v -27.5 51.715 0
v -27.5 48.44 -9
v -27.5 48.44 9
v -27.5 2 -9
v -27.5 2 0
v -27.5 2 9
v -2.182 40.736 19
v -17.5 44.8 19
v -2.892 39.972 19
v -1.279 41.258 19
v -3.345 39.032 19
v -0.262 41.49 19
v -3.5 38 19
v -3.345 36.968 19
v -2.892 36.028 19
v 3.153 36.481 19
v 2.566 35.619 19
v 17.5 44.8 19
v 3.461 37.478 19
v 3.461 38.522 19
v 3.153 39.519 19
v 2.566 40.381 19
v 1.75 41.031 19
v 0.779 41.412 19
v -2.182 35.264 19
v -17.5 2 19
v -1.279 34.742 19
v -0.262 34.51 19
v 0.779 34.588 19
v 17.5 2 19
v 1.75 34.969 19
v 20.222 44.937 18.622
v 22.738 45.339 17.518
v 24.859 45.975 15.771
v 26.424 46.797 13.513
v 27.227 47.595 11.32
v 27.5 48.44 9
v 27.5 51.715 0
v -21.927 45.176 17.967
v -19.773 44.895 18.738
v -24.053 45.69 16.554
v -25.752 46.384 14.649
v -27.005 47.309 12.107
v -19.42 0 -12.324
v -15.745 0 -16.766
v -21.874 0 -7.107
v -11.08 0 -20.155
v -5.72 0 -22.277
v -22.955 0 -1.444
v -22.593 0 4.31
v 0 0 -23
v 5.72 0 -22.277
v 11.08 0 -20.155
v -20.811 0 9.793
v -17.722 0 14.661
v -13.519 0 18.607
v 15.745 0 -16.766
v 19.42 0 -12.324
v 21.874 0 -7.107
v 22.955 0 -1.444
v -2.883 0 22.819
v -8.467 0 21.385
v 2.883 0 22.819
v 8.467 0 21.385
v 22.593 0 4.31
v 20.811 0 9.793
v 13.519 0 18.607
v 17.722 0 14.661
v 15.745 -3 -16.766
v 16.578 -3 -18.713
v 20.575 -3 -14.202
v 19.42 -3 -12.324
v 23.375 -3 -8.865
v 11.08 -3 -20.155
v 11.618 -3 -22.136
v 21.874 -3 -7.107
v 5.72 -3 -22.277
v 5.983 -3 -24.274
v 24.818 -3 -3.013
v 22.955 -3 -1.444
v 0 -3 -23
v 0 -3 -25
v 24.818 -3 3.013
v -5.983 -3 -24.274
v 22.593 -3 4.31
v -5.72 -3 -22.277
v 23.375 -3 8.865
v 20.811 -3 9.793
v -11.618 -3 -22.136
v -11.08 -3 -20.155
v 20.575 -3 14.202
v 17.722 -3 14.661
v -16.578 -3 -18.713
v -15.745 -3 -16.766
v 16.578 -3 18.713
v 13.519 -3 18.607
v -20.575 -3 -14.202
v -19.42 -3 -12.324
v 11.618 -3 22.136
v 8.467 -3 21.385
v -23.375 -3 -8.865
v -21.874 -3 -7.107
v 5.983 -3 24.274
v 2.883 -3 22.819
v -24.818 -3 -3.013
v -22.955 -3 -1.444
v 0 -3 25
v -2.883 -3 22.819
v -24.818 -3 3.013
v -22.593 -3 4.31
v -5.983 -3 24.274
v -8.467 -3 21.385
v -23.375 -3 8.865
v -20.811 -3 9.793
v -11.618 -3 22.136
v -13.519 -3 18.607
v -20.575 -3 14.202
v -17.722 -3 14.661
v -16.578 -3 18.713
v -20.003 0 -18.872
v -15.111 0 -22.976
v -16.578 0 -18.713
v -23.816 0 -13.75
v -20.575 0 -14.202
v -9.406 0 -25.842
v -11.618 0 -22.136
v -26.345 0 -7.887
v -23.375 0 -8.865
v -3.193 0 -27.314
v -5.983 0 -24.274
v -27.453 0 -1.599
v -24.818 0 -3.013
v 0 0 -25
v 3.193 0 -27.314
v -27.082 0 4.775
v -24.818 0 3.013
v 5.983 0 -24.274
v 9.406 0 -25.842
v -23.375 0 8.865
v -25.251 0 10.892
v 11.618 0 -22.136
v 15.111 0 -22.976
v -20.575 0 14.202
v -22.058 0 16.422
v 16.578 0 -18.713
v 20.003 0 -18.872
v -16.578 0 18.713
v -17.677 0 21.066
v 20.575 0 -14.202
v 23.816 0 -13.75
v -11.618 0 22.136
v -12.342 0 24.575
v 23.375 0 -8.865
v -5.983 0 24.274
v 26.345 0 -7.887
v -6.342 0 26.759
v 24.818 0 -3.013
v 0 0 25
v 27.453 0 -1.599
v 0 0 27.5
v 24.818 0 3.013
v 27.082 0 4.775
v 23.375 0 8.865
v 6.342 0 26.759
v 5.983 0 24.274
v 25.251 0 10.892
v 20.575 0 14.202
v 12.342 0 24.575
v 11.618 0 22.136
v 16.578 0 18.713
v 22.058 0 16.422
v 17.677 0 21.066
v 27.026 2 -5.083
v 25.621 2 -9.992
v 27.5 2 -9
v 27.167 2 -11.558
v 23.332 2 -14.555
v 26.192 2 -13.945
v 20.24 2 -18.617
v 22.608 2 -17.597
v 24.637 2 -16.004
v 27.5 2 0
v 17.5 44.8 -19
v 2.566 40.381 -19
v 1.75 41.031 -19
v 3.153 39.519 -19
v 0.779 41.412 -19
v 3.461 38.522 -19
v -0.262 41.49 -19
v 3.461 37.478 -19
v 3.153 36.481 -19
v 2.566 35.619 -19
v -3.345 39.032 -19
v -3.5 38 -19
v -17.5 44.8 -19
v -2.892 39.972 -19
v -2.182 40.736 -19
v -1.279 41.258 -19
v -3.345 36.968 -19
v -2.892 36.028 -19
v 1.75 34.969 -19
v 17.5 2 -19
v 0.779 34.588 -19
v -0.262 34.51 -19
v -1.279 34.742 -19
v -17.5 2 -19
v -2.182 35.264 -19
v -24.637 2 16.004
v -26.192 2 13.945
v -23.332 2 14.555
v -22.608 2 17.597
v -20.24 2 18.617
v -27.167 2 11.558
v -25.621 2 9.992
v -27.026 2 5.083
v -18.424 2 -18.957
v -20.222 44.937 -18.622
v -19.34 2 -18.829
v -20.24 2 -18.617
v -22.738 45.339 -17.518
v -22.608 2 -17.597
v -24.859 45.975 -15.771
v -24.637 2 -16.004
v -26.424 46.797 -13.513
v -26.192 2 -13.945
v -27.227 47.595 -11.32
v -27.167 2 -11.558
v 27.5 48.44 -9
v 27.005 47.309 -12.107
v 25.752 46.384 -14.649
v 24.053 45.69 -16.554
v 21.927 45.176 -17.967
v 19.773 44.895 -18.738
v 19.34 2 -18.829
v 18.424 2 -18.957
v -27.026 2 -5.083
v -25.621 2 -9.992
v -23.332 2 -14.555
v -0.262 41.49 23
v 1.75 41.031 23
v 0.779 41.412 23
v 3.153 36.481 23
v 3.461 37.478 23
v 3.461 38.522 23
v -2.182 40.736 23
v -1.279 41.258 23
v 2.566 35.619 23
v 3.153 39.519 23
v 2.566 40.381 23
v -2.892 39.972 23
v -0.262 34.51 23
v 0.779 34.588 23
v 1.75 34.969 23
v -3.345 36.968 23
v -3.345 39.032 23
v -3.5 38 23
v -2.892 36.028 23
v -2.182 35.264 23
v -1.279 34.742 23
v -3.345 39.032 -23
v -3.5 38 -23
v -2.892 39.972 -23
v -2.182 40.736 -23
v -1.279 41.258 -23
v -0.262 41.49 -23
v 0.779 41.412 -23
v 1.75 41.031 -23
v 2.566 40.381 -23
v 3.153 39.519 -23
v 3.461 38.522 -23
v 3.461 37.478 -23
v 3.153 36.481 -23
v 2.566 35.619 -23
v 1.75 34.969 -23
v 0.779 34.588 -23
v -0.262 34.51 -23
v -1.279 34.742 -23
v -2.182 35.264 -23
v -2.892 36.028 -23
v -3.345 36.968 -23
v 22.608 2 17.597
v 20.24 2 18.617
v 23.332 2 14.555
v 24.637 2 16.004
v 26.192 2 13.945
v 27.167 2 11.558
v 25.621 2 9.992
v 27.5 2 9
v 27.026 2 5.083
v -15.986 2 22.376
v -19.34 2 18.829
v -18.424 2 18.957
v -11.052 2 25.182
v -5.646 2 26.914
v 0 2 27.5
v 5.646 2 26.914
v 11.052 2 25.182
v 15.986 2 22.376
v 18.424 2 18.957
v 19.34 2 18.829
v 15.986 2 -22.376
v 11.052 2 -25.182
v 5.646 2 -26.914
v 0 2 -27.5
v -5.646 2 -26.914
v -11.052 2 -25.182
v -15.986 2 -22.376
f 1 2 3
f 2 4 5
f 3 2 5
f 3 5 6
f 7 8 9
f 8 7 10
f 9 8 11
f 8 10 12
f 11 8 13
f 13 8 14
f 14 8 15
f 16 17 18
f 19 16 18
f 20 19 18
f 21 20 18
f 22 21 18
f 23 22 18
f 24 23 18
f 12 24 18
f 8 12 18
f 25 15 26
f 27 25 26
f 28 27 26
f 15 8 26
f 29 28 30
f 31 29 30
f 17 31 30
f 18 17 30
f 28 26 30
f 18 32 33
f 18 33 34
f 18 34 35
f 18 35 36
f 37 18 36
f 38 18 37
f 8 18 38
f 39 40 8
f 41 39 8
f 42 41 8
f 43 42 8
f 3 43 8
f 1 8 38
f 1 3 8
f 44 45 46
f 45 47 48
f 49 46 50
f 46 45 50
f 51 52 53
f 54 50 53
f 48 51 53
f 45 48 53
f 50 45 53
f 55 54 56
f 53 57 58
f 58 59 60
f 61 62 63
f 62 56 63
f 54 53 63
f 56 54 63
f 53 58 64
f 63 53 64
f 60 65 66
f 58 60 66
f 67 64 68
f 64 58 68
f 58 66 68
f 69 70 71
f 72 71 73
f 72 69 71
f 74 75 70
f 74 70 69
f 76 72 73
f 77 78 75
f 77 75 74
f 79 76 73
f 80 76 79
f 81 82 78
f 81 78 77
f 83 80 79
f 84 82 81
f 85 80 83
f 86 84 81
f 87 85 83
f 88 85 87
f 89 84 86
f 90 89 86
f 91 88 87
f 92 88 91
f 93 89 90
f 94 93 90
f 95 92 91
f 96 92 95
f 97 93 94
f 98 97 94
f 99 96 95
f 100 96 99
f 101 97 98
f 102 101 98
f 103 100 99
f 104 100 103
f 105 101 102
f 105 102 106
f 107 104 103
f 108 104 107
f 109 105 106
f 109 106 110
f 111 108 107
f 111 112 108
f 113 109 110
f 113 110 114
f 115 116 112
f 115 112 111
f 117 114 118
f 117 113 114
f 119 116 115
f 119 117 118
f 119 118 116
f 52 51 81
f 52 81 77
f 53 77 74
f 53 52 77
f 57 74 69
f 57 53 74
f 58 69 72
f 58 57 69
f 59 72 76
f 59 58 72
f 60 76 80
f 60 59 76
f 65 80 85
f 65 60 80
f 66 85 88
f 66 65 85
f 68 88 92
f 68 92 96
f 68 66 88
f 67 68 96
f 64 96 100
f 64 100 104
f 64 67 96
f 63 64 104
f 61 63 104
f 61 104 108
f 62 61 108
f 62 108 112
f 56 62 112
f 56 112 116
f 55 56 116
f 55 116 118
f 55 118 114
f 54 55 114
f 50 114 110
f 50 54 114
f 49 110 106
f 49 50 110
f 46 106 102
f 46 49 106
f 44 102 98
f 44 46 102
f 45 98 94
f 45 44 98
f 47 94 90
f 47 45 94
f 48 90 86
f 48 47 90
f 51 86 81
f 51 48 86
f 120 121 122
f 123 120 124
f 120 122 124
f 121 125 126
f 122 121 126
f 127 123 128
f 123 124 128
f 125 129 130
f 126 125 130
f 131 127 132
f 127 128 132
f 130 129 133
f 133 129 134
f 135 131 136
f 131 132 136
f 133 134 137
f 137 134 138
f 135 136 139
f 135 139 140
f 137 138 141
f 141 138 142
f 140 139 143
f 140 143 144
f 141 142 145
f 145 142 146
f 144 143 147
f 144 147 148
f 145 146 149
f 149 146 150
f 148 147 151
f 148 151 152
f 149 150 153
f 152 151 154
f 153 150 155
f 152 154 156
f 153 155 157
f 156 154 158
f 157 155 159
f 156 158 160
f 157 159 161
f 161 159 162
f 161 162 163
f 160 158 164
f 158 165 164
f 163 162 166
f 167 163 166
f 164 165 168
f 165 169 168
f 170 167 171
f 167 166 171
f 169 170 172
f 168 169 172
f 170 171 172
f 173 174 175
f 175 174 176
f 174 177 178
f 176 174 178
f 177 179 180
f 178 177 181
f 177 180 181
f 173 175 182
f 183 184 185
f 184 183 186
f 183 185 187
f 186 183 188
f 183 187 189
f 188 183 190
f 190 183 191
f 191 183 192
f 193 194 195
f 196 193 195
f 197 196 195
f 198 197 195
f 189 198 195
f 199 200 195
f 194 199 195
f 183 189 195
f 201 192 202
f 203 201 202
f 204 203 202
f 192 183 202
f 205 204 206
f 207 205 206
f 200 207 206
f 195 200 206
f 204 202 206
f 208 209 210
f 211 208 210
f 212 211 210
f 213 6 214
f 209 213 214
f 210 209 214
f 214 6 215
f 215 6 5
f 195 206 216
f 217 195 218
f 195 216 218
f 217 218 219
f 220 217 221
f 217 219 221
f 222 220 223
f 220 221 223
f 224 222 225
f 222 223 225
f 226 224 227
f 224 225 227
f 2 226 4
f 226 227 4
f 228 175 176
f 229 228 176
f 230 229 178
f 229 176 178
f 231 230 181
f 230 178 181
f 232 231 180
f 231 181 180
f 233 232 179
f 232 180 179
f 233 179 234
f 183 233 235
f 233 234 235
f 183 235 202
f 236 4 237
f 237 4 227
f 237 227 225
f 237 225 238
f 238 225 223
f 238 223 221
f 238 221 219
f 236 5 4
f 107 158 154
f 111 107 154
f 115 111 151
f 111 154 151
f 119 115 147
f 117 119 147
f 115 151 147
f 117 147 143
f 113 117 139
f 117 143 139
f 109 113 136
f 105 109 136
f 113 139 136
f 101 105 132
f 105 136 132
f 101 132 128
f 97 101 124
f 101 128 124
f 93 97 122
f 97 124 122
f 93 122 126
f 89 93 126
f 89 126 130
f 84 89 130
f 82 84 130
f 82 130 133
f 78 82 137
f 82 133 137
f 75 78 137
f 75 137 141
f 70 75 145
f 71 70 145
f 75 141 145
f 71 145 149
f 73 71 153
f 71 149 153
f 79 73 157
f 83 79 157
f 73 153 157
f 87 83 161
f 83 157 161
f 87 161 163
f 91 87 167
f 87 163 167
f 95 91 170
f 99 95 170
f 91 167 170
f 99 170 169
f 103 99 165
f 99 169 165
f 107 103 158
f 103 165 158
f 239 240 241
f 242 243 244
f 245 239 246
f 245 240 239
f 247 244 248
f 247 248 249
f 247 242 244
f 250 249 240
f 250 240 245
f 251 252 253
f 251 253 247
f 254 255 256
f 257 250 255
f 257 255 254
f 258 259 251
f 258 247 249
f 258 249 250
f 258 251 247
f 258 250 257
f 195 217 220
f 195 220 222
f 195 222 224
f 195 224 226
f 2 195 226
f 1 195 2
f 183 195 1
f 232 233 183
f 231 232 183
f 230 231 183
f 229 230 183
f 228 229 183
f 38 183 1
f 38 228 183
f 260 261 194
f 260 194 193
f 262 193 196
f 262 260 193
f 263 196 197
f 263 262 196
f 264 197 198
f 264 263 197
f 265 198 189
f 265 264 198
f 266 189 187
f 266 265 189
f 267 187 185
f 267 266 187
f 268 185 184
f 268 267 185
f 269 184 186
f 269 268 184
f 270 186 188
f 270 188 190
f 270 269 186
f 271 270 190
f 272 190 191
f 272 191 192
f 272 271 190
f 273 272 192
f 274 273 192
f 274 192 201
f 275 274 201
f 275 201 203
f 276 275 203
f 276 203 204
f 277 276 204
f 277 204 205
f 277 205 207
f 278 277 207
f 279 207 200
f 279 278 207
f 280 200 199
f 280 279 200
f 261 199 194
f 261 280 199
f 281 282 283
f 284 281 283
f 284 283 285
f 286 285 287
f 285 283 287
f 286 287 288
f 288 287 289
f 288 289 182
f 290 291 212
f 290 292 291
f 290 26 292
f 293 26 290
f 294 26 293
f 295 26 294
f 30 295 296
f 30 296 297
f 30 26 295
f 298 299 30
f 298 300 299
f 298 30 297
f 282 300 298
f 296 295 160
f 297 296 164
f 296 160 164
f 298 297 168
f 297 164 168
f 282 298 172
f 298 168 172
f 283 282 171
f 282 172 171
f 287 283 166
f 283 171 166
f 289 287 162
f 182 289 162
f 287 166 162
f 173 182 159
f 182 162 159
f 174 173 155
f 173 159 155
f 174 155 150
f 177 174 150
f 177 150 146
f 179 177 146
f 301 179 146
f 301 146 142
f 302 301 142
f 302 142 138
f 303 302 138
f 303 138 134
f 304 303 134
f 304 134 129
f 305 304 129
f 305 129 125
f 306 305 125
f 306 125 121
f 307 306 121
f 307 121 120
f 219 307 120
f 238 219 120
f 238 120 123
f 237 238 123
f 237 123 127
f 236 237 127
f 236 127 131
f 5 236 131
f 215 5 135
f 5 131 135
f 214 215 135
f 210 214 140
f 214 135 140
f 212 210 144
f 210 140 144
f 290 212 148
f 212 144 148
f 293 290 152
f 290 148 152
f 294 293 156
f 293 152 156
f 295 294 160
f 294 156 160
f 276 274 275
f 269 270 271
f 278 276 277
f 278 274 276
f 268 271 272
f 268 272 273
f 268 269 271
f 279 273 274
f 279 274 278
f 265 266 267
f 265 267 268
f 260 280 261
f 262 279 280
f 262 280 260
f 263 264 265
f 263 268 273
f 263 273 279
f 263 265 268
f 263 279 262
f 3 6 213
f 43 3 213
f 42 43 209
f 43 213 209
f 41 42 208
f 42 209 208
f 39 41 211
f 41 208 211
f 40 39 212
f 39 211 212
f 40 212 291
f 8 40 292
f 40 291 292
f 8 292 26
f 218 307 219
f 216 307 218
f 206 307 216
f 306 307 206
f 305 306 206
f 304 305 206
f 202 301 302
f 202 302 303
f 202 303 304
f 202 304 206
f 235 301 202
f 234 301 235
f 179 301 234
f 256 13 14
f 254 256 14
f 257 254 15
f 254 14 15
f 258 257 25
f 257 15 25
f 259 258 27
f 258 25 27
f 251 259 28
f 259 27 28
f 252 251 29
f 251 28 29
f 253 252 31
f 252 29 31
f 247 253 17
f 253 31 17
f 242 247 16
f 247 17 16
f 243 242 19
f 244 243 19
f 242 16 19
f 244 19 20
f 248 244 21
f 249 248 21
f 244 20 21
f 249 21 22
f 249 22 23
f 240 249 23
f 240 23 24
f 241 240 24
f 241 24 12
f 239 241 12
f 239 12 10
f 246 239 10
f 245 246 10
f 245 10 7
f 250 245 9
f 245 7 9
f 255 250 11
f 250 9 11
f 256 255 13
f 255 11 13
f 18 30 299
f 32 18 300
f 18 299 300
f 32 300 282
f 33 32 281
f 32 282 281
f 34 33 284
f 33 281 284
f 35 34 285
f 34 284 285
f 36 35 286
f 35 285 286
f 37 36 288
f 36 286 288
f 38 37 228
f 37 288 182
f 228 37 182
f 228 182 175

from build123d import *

# Parameters (mm, degrees)
IZIM1_R                     = 27.5
Y_KSEKLIK_EKSTR_ZYON1_DEPTH = 2
IZIM2_R                     = 25
IZIM2_R_2                   = 23
Y_KSEKLIK_EKSTR_ZYON2_DEPTH = 3
Y_KSEKLIK_EKSTR_ZYON3_DEPTH = 50.8
PAH1_SIZE                   = 8
PAH1_SIZE_2                 = 21.979819356
PAH2_SIZE                   = 8
PAH2_SIZE_2                 = 21.979819356
IZIM4_R                     = 3.5
Y_KSEKLIK_EKSTR_ZYON4_DEPTH = 4
Y_KSEKLIK_EKSTR_ZYON5_START = 4
IZIM5_R                     = 3.5
Y_KSEKLIK_EKSTR_ZYON5_DEPTH = 4


with BuildPart() as part:
    # Çizim1 → Yükseklik-Ekstrüzyon1 (new body)
    with BuildSketch(Plane(origin=(0, 0, 0), x_dir=(1, 0, 0), z_dir=(0, 1, 0))):
        with Locations(Location((0, 0, 0), (0, 0, 270))):
            Circle(IZIM1_R)
    extrude(amount=Y_KSEKLIK_EKSTR_ZYON1_DEPTH)

    # Çizim2 → Yükseklik-Ekstrüzyon2 (add)
    with BuildSketch(Plane.XZ):
        with Locations(Location((0, 0, 0), (0, 0, 90))):
            Circle(IZIM2_R)
        with Locations(Location((0, 0, 0), (0, 0, 270))):
            Circle(IZIM2_R_2, mode=Mode.SUBTRACT)
    extrude(amount=Y_KSEKLIK_EKSTR_ZYON2_DEPTH)

    # Çizim3 → Yükseklik-Ekstrüzyon3 (add)
    with BuildSketch(Plane(origin=(0, 2, 0), x_dir=(1, 0, 0), z_dir=(0, 1, 0))):
        with BuildLine():
            Line((-17.5, -19), (17.5, -19))
            ThreePointArc((17.5, -19), (24.571067812, -16.071067812), (27.5, -9))
            Line((27.5, -9), (27.5, 9))
            ThreePointArc((27.5, 9), (24.571067812, 16.071067812), (17.5, 19))
            Line((17.5, 19), (-17.5, 19))
            ThreePointArc((-17.5, 19), (-24.571067812, 16.071067812), (-27.5, 9))
            Line((-27.5, 9), (-27.5, -9))
            ThreePointArc((-27.5, -9), (-24.571067812, -16.071067812), (-17.5, -19))
        make_face()
    extrude(amount=Y_KSEKLIK_EKSTR_ZYON3_DEPTH)

    # Pah1
    # the kernel refuses this chamfer: 21.979819356, 8 mm, written as the material it takes off along each edge
    with BuildSketch(Plane(origin=(74.519931595, 52.8, -19), x_dir=(0, -0.9950833631817486, -0.0990409022520504), z_dir=(-1, 0, 0))) as pah1_piece_1:
        Polygon((PAH1_SIZE * 0.995083363182, PAH1_SIZE * 0.0990409022521), (-PAH1_SIZE_2 * 0.0990409022504, PAH1_SIZE_2 * 0.995083363165), (0, 0), align=None)
    extrude(amount=149.03986319, mode=Mode.SUBTRACT)

    # Pah2
    # the kernel refuses this chamfer: 21.979819356, 8 mm, written as the material it takes off along each edge
    with BuildSketch(Plane(origin=(-74.519931595, 52.8, 19), x_dir=(0, -0.9950833631817486, 0.0990409022520504), z_dir=(1, 0, 0))) as pah2_piece_1:
        Polygon((PAH2_SIZE * 0.995083363182, PAH2_SIZE * 0.0990409022521), (-PAH2_SIZE_2 * 0.0990409022504, PAH2_SIZE_2 * 0.995083363165), (0, 0), align=None)
    extrude(amount=149.03986319, mode=Mode.SUBTRACT)

    # Çizim4 → Yükseklik-Ekstrüzyon4 (add)
    with BuildSketch(Plane.XY.offset(19)):
        with Locations(Location((0, 38, 0), (0, 0, 180))):
            Circle(IZIM4_R)
    extrude(amount=Y_KSEKLIK_EKSTR_ZYON4_DEPTH)

    # Çizim5 → Yükseklik-Ekstrüzyon5 (add)
    with BuildSketch(Plane(origin=(0, 0, -19), x_dir=(-1, 0, 0), z_dir=(0, 0, -1)).offset(Y_KSEKLIK_EKSTR_ZYON5_START)):
        with Locations((0, 38)):
            Circle(IZIM5_R)
    extrude(amount=-Y_KSEKLIK_EKSTR_ZYON5_DEPTH)


solid = part.part
